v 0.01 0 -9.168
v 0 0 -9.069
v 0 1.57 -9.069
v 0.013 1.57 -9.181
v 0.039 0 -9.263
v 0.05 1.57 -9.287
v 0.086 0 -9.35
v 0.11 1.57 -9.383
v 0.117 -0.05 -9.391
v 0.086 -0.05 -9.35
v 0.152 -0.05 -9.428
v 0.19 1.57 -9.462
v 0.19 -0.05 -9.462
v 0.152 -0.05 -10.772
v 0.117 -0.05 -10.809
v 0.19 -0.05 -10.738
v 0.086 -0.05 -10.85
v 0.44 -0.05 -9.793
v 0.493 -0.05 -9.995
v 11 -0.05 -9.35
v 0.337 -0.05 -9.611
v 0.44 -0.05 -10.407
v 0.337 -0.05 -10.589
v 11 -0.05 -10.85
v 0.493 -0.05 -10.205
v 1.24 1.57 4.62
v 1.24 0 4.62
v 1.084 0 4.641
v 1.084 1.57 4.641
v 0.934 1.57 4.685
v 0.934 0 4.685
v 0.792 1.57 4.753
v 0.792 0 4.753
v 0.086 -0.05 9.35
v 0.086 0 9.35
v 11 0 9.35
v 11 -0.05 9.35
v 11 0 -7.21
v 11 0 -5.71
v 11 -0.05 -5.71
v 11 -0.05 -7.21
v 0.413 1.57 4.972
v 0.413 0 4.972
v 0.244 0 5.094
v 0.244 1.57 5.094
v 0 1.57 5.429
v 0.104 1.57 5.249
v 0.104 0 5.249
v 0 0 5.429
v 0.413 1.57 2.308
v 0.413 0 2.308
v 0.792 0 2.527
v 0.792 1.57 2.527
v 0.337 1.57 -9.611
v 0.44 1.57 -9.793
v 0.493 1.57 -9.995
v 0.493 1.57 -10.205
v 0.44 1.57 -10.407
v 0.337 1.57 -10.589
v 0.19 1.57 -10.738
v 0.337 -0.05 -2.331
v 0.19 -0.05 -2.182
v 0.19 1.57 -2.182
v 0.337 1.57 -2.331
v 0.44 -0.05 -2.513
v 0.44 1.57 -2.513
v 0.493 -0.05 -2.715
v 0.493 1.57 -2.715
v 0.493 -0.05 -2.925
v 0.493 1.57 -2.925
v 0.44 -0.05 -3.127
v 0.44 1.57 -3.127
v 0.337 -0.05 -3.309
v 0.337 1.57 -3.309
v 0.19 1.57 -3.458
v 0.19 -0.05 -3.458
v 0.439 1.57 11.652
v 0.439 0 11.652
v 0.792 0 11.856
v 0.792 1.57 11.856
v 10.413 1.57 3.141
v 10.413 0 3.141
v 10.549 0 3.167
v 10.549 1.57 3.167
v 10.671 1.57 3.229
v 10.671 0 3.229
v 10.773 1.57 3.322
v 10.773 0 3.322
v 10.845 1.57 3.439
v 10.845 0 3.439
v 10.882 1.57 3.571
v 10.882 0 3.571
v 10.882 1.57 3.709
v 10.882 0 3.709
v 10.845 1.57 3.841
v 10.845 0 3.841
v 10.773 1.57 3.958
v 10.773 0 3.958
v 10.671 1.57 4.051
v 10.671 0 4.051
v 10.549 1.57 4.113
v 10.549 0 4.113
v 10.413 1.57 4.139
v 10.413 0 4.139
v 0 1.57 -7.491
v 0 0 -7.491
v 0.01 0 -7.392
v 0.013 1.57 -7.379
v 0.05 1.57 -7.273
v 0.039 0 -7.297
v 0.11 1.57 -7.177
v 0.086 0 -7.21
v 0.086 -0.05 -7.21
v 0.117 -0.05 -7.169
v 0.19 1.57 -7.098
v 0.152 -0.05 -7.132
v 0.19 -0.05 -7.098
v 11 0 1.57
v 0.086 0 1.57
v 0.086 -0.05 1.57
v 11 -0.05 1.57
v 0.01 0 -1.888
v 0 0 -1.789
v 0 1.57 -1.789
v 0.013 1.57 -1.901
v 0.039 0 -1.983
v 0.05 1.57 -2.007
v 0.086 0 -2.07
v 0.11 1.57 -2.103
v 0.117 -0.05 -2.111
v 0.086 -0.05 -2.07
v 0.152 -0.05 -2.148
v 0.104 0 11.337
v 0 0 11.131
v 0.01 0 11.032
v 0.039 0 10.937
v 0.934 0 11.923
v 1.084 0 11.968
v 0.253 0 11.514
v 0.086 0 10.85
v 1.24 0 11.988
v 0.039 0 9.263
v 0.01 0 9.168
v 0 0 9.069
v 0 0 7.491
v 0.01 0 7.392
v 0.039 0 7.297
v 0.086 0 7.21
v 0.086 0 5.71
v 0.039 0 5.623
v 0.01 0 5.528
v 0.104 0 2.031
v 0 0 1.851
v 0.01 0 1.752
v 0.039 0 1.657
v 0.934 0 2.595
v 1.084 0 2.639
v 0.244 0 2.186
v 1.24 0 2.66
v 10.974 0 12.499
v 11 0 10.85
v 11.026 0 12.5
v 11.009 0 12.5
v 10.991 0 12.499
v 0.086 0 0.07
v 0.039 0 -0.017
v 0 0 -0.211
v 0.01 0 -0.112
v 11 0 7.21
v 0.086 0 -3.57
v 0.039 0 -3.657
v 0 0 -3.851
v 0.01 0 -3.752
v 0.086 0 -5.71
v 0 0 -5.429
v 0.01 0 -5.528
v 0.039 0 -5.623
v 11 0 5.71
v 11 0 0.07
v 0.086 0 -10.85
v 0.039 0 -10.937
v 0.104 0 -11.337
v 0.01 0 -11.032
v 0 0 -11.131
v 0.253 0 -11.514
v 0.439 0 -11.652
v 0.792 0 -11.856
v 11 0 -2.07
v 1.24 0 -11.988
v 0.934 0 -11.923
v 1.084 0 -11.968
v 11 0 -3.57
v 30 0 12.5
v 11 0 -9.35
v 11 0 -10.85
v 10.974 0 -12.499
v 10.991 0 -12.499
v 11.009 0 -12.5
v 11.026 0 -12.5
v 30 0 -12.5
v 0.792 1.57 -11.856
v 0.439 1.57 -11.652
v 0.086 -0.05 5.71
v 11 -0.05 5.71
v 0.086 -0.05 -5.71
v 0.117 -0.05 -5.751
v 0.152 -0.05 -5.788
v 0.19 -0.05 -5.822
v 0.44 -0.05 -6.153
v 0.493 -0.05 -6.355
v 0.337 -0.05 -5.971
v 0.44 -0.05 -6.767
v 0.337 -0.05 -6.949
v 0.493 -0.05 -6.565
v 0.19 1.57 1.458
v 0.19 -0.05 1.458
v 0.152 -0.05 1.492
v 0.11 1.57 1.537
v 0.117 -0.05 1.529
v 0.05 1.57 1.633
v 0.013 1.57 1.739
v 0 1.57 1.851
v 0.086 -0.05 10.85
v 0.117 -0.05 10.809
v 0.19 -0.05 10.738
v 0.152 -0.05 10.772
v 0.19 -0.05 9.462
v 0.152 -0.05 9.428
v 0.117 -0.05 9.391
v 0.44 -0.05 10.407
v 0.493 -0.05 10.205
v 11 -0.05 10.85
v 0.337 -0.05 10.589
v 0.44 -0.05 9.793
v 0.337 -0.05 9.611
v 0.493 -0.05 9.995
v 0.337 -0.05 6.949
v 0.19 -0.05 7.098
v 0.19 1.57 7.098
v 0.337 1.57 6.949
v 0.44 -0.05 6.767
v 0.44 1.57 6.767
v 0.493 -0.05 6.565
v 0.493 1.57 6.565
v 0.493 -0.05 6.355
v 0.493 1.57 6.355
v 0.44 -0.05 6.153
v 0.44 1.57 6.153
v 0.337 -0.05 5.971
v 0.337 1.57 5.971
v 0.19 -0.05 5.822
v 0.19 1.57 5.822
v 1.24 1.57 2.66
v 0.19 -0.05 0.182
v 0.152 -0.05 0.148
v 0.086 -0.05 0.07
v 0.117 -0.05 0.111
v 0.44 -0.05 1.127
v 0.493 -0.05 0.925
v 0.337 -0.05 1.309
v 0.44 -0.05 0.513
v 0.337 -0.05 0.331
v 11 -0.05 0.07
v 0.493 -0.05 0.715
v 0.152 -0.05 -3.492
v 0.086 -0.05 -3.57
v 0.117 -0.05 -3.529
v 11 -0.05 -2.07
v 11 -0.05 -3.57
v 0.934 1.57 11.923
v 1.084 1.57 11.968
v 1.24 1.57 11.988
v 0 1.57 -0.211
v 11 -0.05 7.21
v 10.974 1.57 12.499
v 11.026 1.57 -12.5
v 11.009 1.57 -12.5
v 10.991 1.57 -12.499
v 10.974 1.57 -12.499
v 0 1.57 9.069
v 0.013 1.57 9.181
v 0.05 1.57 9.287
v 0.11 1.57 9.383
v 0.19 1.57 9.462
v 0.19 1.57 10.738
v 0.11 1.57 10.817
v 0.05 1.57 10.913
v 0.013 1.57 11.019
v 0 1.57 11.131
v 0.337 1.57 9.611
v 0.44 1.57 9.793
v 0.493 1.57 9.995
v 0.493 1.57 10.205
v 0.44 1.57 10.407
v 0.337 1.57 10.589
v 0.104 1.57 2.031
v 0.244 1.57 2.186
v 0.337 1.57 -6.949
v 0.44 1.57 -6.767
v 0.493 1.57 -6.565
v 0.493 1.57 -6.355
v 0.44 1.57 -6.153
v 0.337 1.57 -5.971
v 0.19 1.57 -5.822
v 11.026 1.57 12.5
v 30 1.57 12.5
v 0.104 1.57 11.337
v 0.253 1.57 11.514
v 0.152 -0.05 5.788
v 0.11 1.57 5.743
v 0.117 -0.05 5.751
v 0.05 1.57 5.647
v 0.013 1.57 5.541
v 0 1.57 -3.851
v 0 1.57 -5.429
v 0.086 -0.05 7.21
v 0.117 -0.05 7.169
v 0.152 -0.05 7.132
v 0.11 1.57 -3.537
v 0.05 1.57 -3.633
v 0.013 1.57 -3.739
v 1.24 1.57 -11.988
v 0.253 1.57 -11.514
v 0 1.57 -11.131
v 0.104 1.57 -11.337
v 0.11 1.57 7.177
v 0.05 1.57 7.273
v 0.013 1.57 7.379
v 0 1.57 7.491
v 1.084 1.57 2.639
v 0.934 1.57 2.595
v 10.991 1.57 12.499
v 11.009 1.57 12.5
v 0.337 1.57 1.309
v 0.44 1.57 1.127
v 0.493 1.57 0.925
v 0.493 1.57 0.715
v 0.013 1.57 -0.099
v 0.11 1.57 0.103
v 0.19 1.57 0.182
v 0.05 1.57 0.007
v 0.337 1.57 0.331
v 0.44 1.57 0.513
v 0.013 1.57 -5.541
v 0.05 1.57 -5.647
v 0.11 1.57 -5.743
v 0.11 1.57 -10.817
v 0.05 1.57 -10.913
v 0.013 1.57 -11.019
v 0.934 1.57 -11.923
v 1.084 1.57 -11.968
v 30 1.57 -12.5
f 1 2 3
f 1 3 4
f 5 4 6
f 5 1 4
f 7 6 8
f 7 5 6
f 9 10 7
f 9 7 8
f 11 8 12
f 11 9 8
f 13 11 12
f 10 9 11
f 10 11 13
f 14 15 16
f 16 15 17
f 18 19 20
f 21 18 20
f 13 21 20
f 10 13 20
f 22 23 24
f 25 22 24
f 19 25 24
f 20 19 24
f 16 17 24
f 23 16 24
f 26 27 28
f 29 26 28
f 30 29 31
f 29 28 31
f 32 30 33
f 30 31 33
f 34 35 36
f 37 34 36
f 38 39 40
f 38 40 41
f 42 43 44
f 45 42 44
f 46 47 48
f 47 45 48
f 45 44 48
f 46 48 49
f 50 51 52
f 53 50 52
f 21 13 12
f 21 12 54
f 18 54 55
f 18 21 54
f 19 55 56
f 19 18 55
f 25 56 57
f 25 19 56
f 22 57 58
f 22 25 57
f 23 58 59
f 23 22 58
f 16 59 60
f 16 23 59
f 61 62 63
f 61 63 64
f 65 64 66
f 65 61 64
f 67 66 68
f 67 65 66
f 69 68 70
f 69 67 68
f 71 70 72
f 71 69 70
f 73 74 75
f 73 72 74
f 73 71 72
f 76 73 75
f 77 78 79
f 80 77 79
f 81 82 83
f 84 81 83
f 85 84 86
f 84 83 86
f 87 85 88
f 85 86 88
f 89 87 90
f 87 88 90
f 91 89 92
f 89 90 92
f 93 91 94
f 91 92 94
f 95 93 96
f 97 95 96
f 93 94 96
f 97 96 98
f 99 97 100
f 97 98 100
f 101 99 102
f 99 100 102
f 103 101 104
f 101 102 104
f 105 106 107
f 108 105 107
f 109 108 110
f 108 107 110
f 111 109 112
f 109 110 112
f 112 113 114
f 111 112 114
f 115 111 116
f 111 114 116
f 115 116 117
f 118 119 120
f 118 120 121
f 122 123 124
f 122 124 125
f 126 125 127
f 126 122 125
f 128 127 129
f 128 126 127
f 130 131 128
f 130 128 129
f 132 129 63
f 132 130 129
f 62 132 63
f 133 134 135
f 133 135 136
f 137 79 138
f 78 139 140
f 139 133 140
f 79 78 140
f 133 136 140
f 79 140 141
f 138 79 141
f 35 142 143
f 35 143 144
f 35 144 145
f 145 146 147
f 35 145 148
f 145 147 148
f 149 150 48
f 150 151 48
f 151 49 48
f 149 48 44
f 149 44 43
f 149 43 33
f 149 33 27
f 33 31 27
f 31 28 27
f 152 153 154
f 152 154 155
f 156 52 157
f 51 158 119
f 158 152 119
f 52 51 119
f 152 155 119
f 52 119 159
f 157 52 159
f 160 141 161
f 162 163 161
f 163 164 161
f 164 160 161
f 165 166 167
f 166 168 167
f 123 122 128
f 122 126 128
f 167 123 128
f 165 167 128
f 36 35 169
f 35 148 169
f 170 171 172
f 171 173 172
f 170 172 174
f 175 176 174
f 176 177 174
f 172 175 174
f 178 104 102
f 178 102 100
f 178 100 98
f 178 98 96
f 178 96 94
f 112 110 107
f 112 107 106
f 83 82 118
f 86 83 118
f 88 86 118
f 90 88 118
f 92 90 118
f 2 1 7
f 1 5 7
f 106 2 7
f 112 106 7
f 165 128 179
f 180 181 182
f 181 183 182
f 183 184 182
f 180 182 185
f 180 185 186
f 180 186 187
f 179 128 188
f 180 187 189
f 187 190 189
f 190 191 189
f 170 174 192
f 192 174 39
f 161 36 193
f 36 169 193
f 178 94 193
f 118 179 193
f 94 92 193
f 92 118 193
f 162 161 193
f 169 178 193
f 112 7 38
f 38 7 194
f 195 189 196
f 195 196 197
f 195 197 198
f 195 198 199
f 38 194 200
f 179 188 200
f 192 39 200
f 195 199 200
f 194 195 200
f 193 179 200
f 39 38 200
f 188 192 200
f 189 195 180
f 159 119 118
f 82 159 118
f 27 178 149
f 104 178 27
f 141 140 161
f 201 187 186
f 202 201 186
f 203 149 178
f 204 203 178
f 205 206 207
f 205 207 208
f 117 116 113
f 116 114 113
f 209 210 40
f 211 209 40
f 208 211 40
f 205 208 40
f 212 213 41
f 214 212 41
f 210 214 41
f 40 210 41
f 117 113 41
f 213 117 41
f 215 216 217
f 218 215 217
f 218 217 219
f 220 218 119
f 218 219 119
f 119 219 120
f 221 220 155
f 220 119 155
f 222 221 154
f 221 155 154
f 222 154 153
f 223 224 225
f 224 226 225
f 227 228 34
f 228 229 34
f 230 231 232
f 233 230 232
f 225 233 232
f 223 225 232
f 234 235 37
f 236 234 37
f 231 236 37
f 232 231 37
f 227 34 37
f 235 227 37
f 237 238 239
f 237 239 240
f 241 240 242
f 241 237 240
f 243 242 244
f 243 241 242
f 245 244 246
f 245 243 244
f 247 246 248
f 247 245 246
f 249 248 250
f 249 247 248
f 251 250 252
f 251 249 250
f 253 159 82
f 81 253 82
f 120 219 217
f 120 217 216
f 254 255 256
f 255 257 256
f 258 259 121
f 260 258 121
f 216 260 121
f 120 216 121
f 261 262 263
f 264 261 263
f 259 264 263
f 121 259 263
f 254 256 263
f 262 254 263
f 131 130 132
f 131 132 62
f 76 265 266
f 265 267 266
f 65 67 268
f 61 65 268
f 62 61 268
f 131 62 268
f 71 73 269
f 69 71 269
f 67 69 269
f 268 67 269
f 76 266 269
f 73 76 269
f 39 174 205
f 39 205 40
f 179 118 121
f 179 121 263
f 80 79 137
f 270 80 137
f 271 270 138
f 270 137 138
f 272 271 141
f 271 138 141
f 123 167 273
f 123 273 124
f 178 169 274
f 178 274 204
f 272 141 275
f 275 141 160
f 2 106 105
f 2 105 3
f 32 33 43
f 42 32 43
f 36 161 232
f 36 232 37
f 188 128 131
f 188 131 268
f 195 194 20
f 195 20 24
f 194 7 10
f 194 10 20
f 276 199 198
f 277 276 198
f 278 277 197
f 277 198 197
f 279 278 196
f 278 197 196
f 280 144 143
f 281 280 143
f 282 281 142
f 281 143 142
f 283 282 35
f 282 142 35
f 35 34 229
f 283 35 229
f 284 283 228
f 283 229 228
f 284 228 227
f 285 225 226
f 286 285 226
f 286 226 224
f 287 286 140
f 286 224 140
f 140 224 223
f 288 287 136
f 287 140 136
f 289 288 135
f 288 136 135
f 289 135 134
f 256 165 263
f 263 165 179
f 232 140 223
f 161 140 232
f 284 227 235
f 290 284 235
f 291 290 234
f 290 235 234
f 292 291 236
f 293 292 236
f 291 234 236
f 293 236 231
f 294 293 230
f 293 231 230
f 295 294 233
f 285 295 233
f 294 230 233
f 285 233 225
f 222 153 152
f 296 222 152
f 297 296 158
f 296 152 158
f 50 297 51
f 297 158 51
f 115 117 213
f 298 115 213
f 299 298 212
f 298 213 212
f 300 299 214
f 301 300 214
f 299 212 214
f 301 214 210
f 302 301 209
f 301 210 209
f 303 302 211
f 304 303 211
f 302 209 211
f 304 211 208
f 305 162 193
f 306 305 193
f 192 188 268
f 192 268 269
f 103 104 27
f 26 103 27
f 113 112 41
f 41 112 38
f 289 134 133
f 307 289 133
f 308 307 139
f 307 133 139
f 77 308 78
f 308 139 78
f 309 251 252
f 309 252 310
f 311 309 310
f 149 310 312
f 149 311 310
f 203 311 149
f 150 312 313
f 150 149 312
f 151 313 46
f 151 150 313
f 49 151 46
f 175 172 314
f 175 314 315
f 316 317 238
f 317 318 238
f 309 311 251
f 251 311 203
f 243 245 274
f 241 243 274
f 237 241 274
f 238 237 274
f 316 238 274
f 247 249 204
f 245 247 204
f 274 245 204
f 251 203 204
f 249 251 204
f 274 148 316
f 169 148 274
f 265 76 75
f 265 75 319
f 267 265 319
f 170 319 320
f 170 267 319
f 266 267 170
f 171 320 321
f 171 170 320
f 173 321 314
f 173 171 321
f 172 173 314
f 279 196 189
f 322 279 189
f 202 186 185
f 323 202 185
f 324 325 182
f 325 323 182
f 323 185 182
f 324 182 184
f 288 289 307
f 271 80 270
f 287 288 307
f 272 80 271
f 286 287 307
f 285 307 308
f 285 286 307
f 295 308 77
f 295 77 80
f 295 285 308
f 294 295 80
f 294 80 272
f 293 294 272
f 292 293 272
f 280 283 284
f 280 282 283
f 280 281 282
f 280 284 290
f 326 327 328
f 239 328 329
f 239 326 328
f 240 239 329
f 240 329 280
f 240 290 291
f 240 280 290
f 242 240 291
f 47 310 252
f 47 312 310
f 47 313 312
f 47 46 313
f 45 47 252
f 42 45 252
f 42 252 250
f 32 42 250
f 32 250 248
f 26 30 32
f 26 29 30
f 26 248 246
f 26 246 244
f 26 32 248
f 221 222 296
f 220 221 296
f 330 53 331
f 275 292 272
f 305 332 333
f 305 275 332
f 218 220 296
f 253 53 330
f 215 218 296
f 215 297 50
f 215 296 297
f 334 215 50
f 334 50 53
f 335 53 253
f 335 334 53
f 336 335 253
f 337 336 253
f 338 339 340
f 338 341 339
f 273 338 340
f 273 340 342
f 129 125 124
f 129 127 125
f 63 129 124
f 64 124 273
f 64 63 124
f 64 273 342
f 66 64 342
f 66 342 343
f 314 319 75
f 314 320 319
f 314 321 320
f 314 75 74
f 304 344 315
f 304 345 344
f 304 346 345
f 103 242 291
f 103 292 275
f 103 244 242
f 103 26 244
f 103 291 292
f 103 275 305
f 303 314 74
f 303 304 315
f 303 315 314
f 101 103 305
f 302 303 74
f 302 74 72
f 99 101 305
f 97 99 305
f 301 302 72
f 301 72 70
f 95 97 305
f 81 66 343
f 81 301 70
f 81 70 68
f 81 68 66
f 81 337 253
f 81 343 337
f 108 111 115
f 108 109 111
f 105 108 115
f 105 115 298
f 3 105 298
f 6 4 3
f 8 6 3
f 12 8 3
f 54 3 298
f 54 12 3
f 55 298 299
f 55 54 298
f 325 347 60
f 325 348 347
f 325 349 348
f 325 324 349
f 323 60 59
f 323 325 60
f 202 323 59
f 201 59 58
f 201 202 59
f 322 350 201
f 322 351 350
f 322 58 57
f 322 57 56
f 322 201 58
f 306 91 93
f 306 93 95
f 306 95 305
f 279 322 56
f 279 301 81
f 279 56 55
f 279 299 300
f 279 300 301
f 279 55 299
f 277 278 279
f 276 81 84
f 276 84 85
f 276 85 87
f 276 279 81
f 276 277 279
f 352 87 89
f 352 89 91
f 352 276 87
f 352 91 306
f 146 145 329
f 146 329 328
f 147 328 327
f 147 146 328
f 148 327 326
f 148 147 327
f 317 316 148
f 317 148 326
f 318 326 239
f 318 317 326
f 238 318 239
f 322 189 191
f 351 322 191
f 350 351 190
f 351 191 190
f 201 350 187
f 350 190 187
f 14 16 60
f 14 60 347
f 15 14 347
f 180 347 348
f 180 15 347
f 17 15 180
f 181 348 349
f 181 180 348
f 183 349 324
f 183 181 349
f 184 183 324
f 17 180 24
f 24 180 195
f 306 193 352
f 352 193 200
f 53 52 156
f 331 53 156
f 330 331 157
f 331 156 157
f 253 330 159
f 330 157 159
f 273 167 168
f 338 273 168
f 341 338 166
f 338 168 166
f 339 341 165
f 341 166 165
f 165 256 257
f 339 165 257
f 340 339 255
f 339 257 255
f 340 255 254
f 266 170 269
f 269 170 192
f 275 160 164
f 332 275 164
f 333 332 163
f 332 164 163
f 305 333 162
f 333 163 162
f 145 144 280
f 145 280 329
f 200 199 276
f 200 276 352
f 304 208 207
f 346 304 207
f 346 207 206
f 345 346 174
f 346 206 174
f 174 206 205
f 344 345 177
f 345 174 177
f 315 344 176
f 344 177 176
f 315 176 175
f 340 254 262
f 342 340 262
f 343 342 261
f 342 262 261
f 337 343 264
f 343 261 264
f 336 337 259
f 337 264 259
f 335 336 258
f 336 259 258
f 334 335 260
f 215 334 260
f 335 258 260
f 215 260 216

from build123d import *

# Parameters (mm, degrees)
SKETCH1_W               = 30
SKETCH1_H               = 25
BOSS_EXTRUDE1_DEPTH     = 1.57
CUT_EXTRUDE1_DEPTH      = 33.53789944
SKETCH2_W               = 11
SKETCH2_H               = 1.5
BOSS_EXTRUDE2_DEPTH     = 0.05
CUT_EXTRUDE2_DEPTH      = 33.53789944
CUT_EXTRUDE2_DEPTH_BACK = 33.53789944
FILLET1_R               = 1


with BuildPart() as part:
    # Sketch1 → Boss-Extrude1 (new body)
    with BuildSketch(Plane(origin=(0, 0, 0), x_dir=(1, 0, 0), z_dir=(0, 1, 0))):
        with Locations((15, 0)):
            Rectangle(SKETCH1_W, SKETCH1_H)
    extrude(amount=BOSS_EXTRUDE1_DEPTH)

    # Sketch3 → Cut-Extrude1 (cut, through all)
    with BuildSketch(Plane(origin=(0, 0, 0), x_dir=(1, 0, 0), z_dir=(0, 1, 0))):
        with BuildLine():
            Line((10.41339187, -4.139314767), (1, -4.632649731))
            Line((1, -4.632649731), (0, -5.21))
            Line((0, -5.21), (0, -2.07))
            Line((0, -2.07), (1, -2.647350269))
            Line((1, -2.647350269), (10.41339187, -3.140685233))
            ThreePointArc((10.41339187, -3.140685233), (10.887223892, -3.64), (10.41339187, -4.139314767))
        make_face()
        Polygon((11, 12.5), (1, 11.975922207), (0, 11.398571938), (0, 12.5), align=None)
        Polygon((11, -12.5), (0, -12.5), (0, -11.398571938), (1, -11.975922207), align=None)
    extrude(amount=CUT_EXTRUDE1_DEPTH, mode=Mode.SUBTRACT)

    # Sketch2 → Boss-Extrude2 (add)
    with BuildSketch(Plane(origin=(0, 0, 0), x_dir=(1, 0, 0), z_dir=(0, 1, 0))):
        with Locations((5.5, -10.1)):
            Rectangle(SKETCH2_W, SKETCH2_H)
        with Locations((5.5, -6.46)):
            Rectangle(SKETCH2_W, SKETCH2_H)
        with Locations((5.5, -0.82)):
            Rectangle(SKETCH2_W, SKETCH2_H)
        with Locations((5.5, 2.82)):
            Rectangle(SKETCH2_W, SKETCH2_H)
        with Locations((5.5, 6.46)):
            Rectangle(SKETCH2_W, SKETCH2_H)
        with Locations((5.5, 10.1)):
            Rectangle(SKETCH2_W, SKETCH2_H)
    extrude(amount=-BOSS_EXTRUDE2_DEPTH)

    # Sketch4 → Cut-Extrude2 (cut, two sides: drawn at the far end of the back side and taken through both)
    with BuildSketch(Plane(origin=(0, 0, 0), x_dir=(1, 0, 0), z_dir=(0, 1, 0)).offset(-CUT_EXTRUDE2_DEPTH_BACK)):
        with BuildLine():
            Line((0, -11.130776406), (0, -9.069223594))
            ThreePointArc((0, -9.069223594), (0.050132295, -9.287441484), (0.19047619, -9.46190032))
            ThreePointArc((0.19047619, -9.46190032), (0.5, -10.1), (0.19047619, -10.73809968))
            ThreePointArc((0.19047619, -10.73809968), (0.050132295, -10.912558516), (0, -11.130776406))
        make_face()
        with BuildLine():
            Line((0, -5.429223594), (0, -7.490776406))
            ThreePointArc((0, -7.490776406), (0.050132295, -7.272558516), (0.19047619, -7.09809968))
            ThreePointArc((0.19047619, -7.09809968), (0.5, -6.46), (0.19047619, -5.82190032))
            ThreePointArc((0.19047619, -5.82190032), (0.050132295, -5.647441484), (0, -5.429223594))
        make_face()
        with BuildLine():
            Line((0, -1.850776406), (0, 0.210776406))
            ThreePointArc((0, 0.210776406), (0.050132295, -0.007441484), (0.19047619, -0.18190032))
            ThreePointArc((0.19047619, -0.18190032), (0.5, -0.82), (0.19047619, -1.45809968))
            ThreePointArc((0.19047619, -1.45809968), (0.050132295, -1.632558516), (0, -1.850776406))
        make_face()
        with BuildLine():
            Line((0, 3.850776406), (0, 1.789223594))
            ThreePointArc((0, 1.789223594), (0.050132295, 2.007441484), (0.19047619, 2.18190032))
            ThreePointArc((0.19047619, 2.18190032), (0.5, 2.82), (0.19047619, 3.45809968))
            ThreePointArc((0.19047619, 3.45809968), (0.050132295, 3.632558516), (0, 3.850776406))
        make_face()
        with BuildLine():
            Line((0, 5.429223594), (0, 7.490776406))
            ThreePointArc((0, 7.490776406), (0.050132295, 7.272558516), (0.19047619, 7.09809968))
            ThreePointArc((0.19047619, 7.09809968), (0.5, 6.46), (0.19047619, 5.82190032))
            ThreePointArc((0.19047619, 5.82190032), (0.050132295, 5.647441484), (0, 5.429223594))
        make_face()
        with BuildLine():
            Line((0, 11.130776406), (0, 9.069223594))
            ThreePointArc((0, 9.069223594), (0.050132295, 9.287441484), (0.19047619, 9.46190032))
            ThreePointArc((0.19047619, 9.46190032), (0.5, 10.1), (0.19047619, 10.73809968))
            ThreePointArc((0.19047619, 10.73809968), (0.050132295, 10.912558516), (0, 11.130776406))
        make_face()
    extrude(amount=CUT_EXTRUDE2_DEPTH + CUT_EXTRUDE2_DEPTH_BACK, mode=Mode.SUBTRACT)

    # Fillet1
    # the kernel refuses this fillet: 1 mm, written as the material it takes off along each edge
    with BuildSketch(Plane(origin=(1, -0.600196898, -11.975922207), x_dir=(0.998629534754574, 0, -0.0523359562429405), z_dir=(0, 1, 0)), Plane(origin=(1, -0.600196898, 4.632649731), x_dir=(0.9986295347545742, 0, -0.05233595624293651), z_dir=(0, 1, 0)), Plane(origin=(1, -0.600196898, 2.647350269), x_dir=(-0.8660254037844378, 0, -0.5000000000000013), z_dir=(0, 1, 0))) as fillet1_piece_1:
        with BuildLine():
            CenterArc((FILLET1_R * 0.24007875908, -FILLET1_R), FILLET1_R, 90, 27)
            Line((-FILLET1_R * 0.213911740659, -FILLET1_R * 0.108993475812), (-FILLET1_R * 0.222991550654, -FILLET1_R * 0.0911733453279))
            Line((-FILLET1_R * 0.222991550654, -FILLET1_R * 0.0911733453279), (-FILLET1_R * 0.0048015751816, FILLET1_R * 0.02))
            Line((-FILLET1_R * 0.0048015751816, FILLET1_R * 0.02), (FILLET1_R * 0.24007875908, FILLET1_R * 0.02))
            Line((FILLET1_R * 0.24007875908, FILLET1_R * 0.02), (FILLET1_R * 0.24007875908, 0))
        make_face()
    extrude(amount=2.770393795, mode=Mode.SUBTRACT)
    with BuildSketch(Plane(origin=(0, -1.266133532, -11.398571938), x_dir=(0.8660254037844373, 0, -0.5000000000000024), z_dir=(0, 1, 0))) as fillet1_piece_2:
        with BuildLine():
            CenterArc((0.506453413, -1), FILLET1_R, 90, 39.818010975)
            Line((-0.133897766, -0.231917733), (-0.146704789, -0.216556088))
            ThreePointArc((-0.146704789, -0.216556088), (-0.084269391, -0.105958867), (-0.017320508, 0.01))
            Line((-0.017320508, 0.01), (0, 0.02))
            Line((0, 0.02), (0.506453413, 0.02))
            Line((0.506453413, 0.02), (0.506453413, 0))
        make_face()
    extrude(amount=4.102267063, mode=Mode.SUBTRACT)
    with BuildSketch(Plane(origin=(0, -1.191538155, 5.21), x_dir=(0.8660254037844375, 0, -0.500000000000002), z_dir=(0, 1, 0))) as fillet1_piece_3:
        with BuildLine():
            CenterArc((0.476615262, -1), FILLET1_R, 90, 35.889723461)
            Line((-0.109611797, -0.189853201), (-0.121336338, -0.173650265))
            ThreePointArc((-0.121336338, -0.173650265), (-0.072126406, -0.084926601), (-0.017320508, 0.01))
            Line((-0.017320508, 0.01), (0, 0.02))
            Line((0, 0.02), (0.476615262, 0.02))
            Line((0.476615262, 0.02), (0.476615262, 0))
        make_face()
    extrude(amount=3.953076309, mode=Mode.SUBTRACT)
    with BuildSketch(Plane(origin=(0, -1.191538155, 2.07), x_dir=(0, 0, -1), z_dir=(0, 1, 0))) as fillet1_piece_4:
        with BuildLine():
            CenterArc((0.627717773, -0.912760925), FILLET1_R, 114.110276539, 35.889723461)
            Line((-0.238307631, -0.412760925), (-0.255628139, -0.402760925))
            Line((-0.255628139, -0.402760925), (-0.017320508, 0.01))
            Line((-0.017320508, 0.01), (0, 0.02))
            ThreePointArc((0, 0.02), (0.109611797, 0.02), (0.21105371, 0.018255218))
            Line((0.21105371, 0.018255218), (0.219223594, 0))
        make_face()
    extrude(amount=3.953076309, mode=Mode.SUBTRACT)
    with BuildSketch(Plane(origin=(0, -1.266133532, 11.398571938), x_dir=(3.4310526757958135e-12, 0, -1.0), z_dir=(0, 1, 0))) as fillet1_piece_5:
        with BuildLine():
            CenterArc((0.612798697, -0.938601521), FILLET1_R, 110.181989025, 39.818010975)
            Line((-0.253226706, -0.438601521), (-0.270547214, -0.428601521))
            Line((-0.270547214, -0.428601521), (-0.017320508, 0.01))
            Line((-0.017320508, 0.01), (0, 0.02))
            ThreePointArc((0, 0.02), (0.133897766, 0.02), (0.260895468, 0.01877203))
            Line((0.260895468, 0.01877203), (0.267795532, 0))
        make_face()
    extrude(amount=4.102267063, mode=Mode.SUBTRACT)
    with BuildSketch(Plane(origin=(1, -0.600196898, 11.975922207), x_dir=(0.998629534754574, 0, 0.0523359562429404), z_dir=(0, 1, 0))) as fillet1_piece_6:
        with BuildLine():
            CenterArc((FILLET1_R * 0.24007875908, FILLET1_R), FILLET1_R, 243, 27)
            Line((-FILLET1_R * 0.213911740659, FILLET1_R * 0.108993475812), (-FILLET1_R * 0.222991550654, FILLET1_R * 0.0911733453279))
            Line((-FILLET1_R * 0.222991550654, FILLET1_R * 0.0911733453279), (-FILLET1_R * 0.0048015751816, -FILLET1_R * 0.02))
            Line((-FILLET1_R * 0.0048015751816, -FILLET1_R * 0.02), (FILLET1_R * 0.24007875908, -FILLET1_R * 0.02))
            Line((FILLET1_R * 0.24007875908, -FILLET1_R * 0.02), (FILLET1_R * 0.24007875908, 0))
        make_face()
    extrude(amount=2.770393795, mode=Mode.SUBTRACT)
    with BuildSketch(Plane(origin=(11, -0.065464804, -12.5), x_dir=(-0.998629534754574, 0, 0.05233595624294029), z_dir=(0, 1, 0)), Plane(origin=(11, -0.065464804, 12.5), x_dir=(1, 0, 0), z_dir=(0, 1, 0))) as fillet1_piece_7:
        with BuildLine():
            CenterArc((FILLET1_R * 0.0261859215692, FILLET1_R), FILLET1_R, 267, 3)
            Line((-FILLET1_R * 0.0261500346738, FILLET1_R * 0.00137046524543), (-FILLET1_R * 0.0271967537986, -FILLET1_R * 0.0186021254497))
            Line((-FILLET1_R * 0.0271967537986, -FILLET1_R * 0.0186021254497), (-FILLET1_R * 0.000523718431384, -FILLET1_R * 0.02))
            Line((-FILLET1_R * 0.000523718431384, -FILLET1_R * 0.02), (FILLET1_R * 0.0261859215692, -FILLET1_R * 0.02))
            Line((FILLET1_R * 0.0261859215692, -FILLET1_R * 0.02), (FILLET1_R * 0.0261859215692, 0))
        make_face()
    extrude(amount=1.700929608, mode=Mode.SUBTRACT)


solid = part.part
